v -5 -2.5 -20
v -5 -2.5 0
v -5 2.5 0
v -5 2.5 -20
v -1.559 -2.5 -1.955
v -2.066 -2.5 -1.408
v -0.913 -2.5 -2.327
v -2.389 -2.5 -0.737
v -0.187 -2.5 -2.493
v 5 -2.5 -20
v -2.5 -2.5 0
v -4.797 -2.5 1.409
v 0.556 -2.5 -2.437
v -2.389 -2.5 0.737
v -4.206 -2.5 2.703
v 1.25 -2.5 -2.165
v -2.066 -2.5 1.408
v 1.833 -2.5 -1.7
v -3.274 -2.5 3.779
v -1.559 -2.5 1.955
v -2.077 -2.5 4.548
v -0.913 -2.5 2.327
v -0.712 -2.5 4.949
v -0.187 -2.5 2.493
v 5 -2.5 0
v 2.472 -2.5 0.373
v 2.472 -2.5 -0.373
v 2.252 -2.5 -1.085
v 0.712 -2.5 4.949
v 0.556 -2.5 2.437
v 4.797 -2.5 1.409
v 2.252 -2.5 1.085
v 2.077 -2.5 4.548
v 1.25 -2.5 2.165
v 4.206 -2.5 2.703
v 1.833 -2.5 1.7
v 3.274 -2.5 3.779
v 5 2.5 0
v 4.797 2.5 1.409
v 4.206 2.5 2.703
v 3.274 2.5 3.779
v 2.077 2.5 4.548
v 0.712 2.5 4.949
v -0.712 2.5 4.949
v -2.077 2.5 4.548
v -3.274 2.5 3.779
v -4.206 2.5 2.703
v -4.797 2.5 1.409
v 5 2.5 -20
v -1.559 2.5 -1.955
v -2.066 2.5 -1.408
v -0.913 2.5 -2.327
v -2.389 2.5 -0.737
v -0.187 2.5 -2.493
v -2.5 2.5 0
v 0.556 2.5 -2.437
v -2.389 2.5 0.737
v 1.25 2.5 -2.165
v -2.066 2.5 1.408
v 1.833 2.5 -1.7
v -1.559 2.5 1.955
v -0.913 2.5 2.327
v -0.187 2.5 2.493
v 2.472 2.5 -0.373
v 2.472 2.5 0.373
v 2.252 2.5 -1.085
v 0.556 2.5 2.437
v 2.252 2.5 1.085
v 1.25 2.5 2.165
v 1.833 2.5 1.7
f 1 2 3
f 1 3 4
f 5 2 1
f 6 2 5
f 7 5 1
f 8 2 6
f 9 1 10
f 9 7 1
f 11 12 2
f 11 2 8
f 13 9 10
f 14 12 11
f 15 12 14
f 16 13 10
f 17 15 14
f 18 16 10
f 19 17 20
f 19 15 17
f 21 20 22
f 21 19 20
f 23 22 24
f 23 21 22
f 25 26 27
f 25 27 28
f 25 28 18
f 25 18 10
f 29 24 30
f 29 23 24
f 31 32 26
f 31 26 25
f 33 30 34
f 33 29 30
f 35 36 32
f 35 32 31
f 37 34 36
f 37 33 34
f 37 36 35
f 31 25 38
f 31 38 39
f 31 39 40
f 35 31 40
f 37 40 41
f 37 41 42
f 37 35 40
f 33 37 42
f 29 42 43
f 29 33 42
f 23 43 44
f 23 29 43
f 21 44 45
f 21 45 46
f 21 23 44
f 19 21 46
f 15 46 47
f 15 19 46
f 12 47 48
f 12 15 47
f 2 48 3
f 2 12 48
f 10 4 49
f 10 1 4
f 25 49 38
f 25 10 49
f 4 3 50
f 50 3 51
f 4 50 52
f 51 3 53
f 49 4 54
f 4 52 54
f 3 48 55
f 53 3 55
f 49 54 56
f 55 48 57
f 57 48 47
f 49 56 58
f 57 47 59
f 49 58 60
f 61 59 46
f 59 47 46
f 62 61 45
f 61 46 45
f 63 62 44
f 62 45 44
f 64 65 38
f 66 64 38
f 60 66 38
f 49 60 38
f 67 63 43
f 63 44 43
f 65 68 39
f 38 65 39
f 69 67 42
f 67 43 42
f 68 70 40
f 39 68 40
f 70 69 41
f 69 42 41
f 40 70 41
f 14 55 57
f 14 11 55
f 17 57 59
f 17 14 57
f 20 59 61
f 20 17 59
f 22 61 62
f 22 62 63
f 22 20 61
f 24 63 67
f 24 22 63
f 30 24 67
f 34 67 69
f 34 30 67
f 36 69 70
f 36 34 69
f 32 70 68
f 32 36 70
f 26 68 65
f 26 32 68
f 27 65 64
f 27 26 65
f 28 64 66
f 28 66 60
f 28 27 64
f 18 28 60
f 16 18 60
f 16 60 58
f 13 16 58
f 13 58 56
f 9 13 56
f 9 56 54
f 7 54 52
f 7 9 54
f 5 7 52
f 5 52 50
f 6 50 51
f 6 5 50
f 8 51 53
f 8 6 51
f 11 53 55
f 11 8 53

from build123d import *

# Parameters (mm, degrees)
F1_DEPTH = 2.5


with BuildPart() as f1:
    # F0 (on Front) → F1 (new body, symmetric)
    with BuildSketch(Plane.XZ):
        with BuildLine():
            Line((5, -20), (5, 0))
            Line((5, 0), (2.5, 0))
            ThreePointArc((2.5, 0), (0, -2.5), (-2.5, 0))
            Line((-2.5, 0), (-5, 0))
            Line((-5, 0), (-5, -20))
            Line((-5, -20), (5, -20))
        make_face()
        with BuildLine():
            Line((2.5, 0), (5, 0))
            ThreePointArc((5, 0), (0, 5), (-5, 0))
            Line((-5, 0), (-2.5, 0))
            ThreePointArc((-2.5, 0), (0, 2.5), (2.5, 0))
        make_face()
    extrude(amount=F1_DEPTH, both=True)


solid = f1.part
